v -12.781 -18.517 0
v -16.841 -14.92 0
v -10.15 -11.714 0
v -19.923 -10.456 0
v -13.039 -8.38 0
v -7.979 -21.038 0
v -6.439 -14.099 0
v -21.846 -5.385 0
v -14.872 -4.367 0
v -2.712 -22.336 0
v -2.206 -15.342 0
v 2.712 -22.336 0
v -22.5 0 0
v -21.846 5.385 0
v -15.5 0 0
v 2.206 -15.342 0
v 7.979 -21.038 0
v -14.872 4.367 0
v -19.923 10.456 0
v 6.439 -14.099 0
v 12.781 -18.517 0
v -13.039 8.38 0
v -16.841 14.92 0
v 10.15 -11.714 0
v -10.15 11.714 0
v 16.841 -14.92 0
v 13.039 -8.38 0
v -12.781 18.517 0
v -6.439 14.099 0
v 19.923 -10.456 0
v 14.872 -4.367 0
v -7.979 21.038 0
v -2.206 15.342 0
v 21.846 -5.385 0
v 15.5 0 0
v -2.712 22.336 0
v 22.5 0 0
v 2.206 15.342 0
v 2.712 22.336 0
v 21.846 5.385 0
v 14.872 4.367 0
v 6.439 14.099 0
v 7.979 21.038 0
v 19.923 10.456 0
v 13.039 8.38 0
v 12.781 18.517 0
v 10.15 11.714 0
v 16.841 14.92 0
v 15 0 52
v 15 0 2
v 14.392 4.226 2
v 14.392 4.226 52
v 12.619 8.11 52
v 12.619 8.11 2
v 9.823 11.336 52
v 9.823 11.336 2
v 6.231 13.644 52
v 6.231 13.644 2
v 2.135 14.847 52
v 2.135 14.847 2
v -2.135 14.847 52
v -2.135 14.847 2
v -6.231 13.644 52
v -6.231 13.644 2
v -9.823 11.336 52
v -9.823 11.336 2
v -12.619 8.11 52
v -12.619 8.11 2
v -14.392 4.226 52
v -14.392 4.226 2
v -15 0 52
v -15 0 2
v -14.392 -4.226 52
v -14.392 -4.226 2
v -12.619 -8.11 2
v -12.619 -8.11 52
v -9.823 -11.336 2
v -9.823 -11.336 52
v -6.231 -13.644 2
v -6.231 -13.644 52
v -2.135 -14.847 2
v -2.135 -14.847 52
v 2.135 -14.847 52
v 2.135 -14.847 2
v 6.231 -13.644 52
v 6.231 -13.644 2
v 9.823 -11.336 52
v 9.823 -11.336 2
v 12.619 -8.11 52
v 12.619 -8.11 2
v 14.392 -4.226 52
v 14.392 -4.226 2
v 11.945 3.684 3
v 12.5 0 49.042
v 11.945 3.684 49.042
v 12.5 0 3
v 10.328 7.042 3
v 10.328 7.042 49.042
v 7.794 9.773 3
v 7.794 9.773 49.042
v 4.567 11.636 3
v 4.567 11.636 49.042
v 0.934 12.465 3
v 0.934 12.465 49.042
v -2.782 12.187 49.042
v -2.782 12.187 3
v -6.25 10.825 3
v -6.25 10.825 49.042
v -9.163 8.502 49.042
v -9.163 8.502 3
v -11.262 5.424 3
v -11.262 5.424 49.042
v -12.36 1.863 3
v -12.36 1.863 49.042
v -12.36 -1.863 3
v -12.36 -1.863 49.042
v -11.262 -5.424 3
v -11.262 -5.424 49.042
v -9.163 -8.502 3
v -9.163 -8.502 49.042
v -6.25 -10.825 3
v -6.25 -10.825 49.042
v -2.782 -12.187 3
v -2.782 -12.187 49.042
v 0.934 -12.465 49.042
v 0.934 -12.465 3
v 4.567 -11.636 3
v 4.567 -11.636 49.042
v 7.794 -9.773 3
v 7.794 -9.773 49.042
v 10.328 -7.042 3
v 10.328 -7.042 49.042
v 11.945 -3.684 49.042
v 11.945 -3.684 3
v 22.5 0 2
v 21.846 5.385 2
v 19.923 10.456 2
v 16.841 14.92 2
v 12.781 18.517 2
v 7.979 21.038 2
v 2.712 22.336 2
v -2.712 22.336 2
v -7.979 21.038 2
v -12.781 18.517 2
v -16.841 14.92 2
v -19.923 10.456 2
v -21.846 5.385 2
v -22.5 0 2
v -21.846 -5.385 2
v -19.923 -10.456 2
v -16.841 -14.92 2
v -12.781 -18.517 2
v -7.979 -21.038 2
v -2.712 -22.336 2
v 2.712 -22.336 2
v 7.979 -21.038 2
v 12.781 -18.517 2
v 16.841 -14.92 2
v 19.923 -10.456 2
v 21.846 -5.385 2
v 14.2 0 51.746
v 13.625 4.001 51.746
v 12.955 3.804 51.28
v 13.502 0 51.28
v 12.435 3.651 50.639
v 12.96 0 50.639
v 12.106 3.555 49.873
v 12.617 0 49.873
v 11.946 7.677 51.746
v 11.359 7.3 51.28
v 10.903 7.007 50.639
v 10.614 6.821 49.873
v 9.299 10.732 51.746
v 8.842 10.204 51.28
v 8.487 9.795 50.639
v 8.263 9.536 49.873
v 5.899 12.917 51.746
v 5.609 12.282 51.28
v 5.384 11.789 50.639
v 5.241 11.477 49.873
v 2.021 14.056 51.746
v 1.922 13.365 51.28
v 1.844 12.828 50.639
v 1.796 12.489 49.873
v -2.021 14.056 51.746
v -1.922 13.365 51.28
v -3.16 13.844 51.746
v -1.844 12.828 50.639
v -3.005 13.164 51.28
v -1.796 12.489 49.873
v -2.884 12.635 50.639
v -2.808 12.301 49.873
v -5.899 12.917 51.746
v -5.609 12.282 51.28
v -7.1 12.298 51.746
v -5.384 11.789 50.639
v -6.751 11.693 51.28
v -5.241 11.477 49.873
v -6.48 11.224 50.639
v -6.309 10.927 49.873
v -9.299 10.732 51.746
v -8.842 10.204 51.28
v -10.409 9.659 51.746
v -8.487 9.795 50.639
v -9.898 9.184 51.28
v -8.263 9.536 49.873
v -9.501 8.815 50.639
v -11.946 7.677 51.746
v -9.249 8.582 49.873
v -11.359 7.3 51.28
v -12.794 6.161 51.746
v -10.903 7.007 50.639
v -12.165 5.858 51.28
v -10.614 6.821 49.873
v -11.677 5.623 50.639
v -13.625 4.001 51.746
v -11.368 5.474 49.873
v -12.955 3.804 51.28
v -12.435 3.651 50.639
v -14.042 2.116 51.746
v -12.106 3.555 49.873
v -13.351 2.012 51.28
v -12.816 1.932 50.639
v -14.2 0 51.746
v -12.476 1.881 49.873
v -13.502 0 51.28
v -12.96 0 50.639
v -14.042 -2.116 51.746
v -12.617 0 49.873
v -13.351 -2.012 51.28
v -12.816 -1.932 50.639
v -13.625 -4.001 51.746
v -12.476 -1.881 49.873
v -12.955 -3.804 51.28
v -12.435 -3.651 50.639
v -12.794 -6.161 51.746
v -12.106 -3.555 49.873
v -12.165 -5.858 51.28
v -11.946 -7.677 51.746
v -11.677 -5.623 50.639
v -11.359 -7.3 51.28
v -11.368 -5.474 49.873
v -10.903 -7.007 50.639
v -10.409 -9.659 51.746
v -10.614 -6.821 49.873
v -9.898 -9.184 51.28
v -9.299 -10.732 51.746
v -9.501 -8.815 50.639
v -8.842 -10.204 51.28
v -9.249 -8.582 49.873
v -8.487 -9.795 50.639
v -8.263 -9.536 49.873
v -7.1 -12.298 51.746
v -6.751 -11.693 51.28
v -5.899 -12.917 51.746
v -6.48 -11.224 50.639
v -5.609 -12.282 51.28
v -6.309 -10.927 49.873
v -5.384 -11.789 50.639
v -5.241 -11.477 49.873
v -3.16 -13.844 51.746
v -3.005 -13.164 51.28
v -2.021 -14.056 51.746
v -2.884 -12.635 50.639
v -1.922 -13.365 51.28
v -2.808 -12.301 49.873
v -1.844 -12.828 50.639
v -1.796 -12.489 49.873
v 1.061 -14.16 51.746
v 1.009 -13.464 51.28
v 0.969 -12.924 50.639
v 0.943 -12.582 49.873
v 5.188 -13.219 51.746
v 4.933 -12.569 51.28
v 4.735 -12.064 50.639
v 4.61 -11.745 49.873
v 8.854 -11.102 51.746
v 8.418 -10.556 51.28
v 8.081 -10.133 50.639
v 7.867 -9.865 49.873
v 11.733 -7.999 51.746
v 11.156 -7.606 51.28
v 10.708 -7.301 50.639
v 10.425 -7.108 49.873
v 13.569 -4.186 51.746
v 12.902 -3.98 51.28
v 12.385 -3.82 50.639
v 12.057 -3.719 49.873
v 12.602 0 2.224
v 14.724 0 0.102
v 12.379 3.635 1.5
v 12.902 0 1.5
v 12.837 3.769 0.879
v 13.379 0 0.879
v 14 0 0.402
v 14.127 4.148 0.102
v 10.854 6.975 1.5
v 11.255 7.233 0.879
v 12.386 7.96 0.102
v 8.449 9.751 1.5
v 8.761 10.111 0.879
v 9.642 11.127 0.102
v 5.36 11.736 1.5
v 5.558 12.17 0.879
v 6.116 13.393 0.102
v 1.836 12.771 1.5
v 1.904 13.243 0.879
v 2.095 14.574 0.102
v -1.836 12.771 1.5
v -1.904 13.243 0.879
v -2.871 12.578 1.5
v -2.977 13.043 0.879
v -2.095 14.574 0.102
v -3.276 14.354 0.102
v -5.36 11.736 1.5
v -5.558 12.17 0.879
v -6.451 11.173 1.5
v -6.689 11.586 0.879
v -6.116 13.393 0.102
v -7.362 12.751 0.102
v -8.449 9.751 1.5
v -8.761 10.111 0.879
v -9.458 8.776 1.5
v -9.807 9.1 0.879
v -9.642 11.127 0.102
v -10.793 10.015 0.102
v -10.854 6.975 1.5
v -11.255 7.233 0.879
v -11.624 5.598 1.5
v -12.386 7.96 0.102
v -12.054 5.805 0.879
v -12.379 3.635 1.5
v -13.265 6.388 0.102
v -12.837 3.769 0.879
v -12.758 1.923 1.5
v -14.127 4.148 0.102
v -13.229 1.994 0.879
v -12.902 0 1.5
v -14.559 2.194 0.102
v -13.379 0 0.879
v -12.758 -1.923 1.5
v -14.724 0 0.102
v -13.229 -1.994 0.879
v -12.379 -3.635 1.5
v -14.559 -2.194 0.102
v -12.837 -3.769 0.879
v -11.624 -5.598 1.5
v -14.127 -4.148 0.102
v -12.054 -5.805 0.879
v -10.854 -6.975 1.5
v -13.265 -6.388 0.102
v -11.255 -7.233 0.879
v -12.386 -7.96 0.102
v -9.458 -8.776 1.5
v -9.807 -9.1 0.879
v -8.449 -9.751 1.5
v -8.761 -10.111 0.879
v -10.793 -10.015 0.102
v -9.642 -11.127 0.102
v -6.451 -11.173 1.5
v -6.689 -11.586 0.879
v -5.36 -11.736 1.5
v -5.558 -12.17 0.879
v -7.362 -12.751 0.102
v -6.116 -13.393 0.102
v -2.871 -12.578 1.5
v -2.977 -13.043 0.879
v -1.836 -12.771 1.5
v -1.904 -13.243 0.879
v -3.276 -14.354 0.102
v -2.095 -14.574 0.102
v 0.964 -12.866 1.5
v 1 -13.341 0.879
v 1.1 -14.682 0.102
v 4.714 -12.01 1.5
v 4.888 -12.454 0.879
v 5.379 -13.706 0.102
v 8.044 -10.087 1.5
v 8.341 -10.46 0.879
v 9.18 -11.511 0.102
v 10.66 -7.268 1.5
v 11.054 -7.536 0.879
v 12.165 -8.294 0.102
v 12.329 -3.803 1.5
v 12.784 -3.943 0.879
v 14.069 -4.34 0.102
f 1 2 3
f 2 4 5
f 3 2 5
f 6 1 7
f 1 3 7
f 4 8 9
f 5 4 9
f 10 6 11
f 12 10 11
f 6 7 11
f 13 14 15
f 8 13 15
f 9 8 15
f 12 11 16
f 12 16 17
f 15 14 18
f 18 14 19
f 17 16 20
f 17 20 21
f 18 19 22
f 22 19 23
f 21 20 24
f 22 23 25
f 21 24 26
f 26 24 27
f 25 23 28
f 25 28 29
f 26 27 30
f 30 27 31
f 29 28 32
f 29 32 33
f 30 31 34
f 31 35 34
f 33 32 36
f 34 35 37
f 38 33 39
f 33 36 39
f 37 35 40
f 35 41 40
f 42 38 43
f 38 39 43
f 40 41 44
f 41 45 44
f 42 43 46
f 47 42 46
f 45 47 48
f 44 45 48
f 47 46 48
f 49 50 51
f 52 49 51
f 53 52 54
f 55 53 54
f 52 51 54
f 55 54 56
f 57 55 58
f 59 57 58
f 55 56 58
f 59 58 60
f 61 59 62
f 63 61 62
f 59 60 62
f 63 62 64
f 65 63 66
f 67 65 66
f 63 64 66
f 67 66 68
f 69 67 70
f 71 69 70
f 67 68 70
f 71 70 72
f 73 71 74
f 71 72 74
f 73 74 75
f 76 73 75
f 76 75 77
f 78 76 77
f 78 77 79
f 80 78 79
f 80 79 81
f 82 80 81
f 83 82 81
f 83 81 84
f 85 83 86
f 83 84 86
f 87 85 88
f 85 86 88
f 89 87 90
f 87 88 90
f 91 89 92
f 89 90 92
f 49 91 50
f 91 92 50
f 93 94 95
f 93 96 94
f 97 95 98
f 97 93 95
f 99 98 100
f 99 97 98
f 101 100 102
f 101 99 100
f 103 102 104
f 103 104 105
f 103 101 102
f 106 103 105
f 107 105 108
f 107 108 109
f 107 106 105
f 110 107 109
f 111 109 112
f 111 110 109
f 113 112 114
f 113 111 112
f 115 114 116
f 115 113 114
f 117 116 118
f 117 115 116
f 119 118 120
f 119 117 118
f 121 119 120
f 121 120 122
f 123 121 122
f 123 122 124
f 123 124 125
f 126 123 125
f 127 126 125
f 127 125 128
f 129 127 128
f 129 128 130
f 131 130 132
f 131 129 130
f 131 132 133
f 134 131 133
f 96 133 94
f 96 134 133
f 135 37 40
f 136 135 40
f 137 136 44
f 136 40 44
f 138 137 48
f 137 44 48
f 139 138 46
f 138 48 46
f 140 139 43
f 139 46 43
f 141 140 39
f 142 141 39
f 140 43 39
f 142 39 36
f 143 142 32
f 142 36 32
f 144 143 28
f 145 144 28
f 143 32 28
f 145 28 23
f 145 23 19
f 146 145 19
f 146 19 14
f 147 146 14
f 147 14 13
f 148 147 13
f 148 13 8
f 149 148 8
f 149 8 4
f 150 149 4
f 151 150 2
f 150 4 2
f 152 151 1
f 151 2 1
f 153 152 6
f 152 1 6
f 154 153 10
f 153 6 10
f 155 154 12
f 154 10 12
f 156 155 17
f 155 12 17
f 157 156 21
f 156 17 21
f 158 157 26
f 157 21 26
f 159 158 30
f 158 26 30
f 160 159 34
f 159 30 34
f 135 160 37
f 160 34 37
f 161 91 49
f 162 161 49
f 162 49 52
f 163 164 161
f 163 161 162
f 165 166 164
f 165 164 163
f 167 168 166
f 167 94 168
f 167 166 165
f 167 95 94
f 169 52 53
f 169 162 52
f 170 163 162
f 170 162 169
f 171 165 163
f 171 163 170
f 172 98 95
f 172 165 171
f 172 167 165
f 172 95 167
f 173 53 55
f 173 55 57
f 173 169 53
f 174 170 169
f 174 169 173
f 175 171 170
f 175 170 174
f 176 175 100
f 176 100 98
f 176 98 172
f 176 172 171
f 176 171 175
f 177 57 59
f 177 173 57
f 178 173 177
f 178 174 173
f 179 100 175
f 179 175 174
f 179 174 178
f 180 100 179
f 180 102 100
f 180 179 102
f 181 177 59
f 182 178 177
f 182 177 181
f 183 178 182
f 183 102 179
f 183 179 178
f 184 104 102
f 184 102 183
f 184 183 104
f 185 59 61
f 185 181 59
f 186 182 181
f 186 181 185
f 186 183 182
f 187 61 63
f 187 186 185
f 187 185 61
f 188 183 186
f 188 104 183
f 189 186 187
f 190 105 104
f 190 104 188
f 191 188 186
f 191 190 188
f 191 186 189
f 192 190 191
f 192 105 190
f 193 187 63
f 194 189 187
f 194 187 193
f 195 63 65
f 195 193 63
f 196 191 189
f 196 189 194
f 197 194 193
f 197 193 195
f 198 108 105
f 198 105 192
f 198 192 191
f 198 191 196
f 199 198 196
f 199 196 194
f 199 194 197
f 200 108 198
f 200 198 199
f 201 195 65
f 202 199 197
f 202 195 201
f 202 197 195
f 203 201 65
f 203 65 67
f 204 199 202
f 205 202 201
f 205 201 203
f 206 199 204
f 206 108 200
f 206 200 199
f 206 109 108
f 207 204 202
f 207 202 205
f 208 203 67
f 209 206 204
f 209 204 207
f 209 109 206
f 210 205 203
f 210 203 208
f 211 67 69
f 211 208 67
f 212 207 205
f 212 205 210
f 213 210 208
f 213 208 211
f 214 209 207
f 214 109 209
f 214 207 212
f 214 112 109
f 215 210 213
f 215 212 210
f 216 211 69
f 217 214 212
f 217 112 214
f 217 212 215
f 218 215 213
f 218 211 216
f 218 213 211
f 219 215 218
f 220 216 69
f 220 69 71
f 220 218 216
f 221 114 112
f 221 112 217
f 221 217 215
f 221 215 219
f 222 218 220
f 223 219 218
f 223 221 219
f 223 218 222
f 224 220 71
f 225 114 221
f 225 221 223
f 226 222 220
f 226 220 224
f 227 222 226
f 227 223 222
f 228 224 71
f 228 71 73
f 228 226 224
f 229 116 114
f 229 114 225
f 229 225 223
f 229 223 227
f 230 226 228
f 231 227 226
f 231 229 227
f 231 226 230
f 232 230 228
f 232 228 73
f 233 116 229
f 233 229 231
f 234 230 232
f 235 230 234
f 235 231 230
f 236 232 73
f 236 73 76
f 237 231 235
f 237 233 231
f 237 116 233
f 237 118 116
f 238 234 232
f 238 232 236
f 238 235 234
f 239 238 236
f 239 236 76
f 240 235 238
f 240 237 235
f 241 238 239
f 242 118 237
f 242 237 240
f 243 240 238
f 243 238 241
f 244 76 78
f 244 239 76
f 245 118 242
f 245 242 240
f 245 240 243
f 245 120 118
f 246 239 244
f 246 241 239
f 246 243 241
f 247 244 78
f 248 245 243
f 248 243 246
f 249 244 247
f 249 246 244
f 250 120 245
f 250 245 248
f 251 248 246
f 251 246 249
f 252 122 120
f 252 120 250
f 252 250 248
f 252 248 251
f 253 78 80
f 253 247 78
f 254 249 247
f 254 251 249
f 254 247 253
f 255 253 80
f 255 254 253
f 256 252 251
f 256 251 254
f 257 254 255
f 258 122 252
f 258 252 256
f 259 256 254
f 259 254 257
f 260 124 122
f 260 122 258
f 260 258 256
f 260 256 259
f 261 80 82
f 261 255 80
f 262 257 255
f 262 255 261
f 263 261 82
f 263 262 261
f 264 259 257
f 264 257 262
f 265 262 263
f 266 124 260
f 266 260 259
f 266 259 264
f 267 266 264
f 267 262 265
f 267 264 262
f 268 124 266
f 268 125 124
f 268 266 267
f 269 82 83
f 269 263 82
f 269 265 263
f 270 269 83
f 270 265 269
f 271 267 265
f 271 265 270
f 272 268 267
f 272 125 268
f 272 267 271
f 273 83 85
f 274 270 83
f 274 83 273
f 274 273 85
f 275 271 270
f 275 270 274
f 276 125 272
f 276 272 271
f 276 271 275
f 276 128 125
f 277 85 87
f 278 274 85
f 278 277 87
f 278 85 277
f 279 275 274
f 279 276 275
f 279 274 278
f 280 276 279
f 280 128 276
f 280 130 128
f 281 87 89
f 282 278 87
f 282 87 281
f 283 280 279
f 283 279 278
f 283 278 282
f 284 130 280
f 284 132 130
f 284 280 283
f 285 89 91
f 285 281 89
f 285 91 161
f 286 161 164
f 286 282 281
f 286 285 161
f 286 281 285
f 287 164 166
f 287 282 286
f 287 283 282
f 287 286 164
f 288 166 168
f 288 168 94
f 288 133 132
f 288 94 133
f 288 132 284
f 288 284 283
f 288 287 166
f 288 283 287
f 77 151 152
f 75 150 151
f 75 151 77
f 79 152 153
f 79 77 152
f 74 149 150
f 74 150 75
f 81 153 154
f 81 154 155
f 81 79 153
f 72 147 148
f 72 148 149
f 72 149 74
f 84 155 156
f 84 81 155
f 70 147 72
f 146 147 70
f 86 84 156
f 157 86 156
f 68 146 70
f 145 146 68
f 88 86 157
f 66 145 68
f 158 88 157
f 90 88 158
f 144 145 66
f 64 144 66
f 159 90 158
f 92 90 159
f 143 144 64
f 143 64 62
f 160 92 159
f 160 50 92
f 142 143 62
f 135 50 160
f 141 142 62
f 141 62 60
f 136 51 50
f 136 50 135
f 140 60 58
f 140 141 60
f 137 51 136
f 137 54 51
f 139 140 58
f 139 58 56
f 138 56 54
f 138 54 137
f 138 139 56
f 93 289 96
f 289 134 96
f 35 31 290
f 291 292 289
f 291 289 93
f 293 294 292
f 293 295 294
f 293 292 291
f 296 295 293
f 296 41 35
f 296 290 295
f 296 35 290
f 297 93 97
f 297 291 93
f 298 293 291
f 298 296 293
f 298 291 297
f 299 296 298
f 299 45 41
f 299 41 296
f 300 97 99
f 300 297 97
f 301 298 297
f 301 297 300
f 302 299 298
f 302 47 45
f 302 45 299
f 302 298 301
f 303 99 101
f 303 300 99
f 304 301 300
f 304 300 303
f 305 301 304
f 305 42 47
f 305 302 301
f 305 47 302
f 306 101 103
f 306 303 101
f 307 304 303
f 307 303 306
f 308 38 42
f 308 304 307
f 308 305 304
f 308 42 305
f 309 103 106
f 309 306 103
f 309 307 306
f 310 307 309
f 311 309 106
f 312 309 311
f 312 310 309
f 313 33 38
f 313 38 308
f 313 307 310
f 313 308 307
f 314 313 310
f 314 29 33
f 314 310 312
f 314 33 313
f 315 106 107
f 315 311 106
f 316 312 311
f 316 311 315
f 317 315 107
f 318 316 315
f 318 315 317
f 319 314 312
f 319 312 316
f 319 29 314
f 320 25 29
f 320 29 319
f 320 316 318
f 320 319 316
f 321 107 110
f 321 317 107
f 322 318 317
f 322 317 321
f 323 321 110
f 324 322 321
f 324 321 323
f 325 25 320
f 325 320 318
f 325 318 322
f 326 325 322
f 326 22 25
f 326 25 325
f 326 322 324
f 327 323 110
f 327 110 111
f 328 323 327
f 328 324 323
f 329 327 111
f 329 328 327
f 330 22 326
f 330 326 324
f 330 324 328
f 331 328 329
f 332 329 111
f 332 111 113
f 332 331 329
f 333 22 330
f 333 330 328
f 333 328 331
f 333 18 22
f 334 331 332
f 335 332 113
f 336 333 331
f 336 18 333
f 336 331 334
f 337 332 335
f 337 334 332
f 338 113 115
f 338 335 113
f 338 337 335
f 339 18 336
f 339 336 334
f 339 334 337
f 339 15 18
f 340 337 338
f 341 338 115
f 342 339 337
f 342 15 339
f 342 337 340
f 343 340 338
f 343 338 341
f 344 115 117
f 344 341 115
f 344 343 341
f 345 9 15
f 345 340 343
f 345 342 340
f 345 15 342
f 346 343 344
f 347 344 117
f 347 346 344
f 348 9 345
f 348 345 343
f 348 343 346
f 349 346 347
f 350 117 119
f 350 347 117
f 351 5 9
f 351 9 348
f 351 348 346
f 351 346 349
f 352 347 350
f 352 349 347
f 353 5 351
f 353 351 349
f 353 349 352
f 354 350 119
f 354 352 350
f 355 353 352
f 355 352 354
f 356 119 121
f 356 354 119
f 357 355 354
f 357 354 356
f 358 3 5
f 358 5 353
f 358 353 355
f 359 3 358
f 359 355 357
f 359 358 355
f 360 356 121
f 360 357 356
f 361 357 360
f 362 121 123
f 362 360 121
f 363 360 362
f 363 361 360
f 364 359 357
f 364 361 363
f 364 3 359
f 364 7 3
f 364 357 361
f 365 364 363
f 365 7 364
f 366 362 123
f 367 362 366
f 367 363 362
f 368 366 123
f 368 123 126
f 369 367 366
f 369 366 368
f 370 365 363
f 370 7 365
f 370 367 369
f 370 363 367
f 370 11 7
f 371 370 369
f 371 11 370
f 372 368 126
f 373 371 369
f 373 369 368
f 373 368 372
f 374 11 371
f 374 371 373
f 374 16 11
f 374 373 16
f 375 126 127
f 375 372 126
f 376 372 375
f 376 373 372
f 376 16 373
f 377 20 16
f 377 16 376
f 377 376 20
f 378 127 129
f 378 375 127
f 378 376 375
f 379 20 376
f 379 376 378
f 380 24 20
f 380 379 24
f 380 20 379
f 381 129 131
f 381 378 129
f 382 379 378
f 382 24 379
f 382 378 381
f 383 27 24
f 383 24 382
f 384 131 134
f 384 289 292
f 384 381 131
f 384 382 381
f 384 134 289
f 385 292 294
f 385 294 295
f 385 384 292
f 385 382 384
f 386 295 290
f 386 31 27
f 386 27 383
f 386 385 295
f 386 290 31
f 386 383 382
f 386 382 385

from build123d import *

# Parameters (mm, degrees)
F0_R     = 22.5
F0_R_2   = 12.5
F1_DEPTH = 2
F2_R     = 15
F2_R_2   = 12.5
F3_DEPTH = 50


# Not quite as in the source:
# - a fillet or chamfer that OpenCascade refuses, or shapes differently, is made with other operations: its cross-section is extruded or revolved along the edge and cut away or added


with BuildPart() as f1:
    # F0 (on Top) → F1 (new body)
    with BuildSketch(Plane.XY):
        Circle(F0_R)
        Circle(F0_R_2, mode=Mode.SUBTRACT)
    extrude(amount=F1_DEPTH)

    # F2 (on face) → F3 (join)
    with BuildSketch(Plane.XY.offset(2)):
        Circle(F2_R)
        Circle(F2_R_2, mode=Mode.SUBTRACT)
    extrude(amount=F3_DEPTH)

    # F4: fillet of radius 3 on 2 edges, made by hand

    # F4_s1 → F4_t2 (revolve, cut)
    with BuildSketch(Plane.XZ):
        with BuildLine():
            ThreePointArc((12.5, 3), (13.3786796564, 0.8786796564), (15.5, 0))
            Line((15.5, 0), (12.5, 0))
            Line((12.5, 0), (12.5, 3))
        make_face()
    revolve(axis=Axis((0, 0, 0), (0, 0, 1)), mode=Mode.SUBTRACT)

    # F4_s3 → F4_t4 (revolve, cut)
    with BuildSketch(Plane.XZ):
        with BuildLine():
            ThreePointArc((15, 52), (13.2087121525, 50.9784517816), (12.5, 49.0419601084))
            Line((12.5, 49.0419601084), (12.5, 52))
            Line((12.5, 52), (15, 52))
        make_face()
    revolve(axis=Axis((0, 0, 52), (0, 0, 1)), mode=Mode.SUBTRACT)


solid = f1.part
